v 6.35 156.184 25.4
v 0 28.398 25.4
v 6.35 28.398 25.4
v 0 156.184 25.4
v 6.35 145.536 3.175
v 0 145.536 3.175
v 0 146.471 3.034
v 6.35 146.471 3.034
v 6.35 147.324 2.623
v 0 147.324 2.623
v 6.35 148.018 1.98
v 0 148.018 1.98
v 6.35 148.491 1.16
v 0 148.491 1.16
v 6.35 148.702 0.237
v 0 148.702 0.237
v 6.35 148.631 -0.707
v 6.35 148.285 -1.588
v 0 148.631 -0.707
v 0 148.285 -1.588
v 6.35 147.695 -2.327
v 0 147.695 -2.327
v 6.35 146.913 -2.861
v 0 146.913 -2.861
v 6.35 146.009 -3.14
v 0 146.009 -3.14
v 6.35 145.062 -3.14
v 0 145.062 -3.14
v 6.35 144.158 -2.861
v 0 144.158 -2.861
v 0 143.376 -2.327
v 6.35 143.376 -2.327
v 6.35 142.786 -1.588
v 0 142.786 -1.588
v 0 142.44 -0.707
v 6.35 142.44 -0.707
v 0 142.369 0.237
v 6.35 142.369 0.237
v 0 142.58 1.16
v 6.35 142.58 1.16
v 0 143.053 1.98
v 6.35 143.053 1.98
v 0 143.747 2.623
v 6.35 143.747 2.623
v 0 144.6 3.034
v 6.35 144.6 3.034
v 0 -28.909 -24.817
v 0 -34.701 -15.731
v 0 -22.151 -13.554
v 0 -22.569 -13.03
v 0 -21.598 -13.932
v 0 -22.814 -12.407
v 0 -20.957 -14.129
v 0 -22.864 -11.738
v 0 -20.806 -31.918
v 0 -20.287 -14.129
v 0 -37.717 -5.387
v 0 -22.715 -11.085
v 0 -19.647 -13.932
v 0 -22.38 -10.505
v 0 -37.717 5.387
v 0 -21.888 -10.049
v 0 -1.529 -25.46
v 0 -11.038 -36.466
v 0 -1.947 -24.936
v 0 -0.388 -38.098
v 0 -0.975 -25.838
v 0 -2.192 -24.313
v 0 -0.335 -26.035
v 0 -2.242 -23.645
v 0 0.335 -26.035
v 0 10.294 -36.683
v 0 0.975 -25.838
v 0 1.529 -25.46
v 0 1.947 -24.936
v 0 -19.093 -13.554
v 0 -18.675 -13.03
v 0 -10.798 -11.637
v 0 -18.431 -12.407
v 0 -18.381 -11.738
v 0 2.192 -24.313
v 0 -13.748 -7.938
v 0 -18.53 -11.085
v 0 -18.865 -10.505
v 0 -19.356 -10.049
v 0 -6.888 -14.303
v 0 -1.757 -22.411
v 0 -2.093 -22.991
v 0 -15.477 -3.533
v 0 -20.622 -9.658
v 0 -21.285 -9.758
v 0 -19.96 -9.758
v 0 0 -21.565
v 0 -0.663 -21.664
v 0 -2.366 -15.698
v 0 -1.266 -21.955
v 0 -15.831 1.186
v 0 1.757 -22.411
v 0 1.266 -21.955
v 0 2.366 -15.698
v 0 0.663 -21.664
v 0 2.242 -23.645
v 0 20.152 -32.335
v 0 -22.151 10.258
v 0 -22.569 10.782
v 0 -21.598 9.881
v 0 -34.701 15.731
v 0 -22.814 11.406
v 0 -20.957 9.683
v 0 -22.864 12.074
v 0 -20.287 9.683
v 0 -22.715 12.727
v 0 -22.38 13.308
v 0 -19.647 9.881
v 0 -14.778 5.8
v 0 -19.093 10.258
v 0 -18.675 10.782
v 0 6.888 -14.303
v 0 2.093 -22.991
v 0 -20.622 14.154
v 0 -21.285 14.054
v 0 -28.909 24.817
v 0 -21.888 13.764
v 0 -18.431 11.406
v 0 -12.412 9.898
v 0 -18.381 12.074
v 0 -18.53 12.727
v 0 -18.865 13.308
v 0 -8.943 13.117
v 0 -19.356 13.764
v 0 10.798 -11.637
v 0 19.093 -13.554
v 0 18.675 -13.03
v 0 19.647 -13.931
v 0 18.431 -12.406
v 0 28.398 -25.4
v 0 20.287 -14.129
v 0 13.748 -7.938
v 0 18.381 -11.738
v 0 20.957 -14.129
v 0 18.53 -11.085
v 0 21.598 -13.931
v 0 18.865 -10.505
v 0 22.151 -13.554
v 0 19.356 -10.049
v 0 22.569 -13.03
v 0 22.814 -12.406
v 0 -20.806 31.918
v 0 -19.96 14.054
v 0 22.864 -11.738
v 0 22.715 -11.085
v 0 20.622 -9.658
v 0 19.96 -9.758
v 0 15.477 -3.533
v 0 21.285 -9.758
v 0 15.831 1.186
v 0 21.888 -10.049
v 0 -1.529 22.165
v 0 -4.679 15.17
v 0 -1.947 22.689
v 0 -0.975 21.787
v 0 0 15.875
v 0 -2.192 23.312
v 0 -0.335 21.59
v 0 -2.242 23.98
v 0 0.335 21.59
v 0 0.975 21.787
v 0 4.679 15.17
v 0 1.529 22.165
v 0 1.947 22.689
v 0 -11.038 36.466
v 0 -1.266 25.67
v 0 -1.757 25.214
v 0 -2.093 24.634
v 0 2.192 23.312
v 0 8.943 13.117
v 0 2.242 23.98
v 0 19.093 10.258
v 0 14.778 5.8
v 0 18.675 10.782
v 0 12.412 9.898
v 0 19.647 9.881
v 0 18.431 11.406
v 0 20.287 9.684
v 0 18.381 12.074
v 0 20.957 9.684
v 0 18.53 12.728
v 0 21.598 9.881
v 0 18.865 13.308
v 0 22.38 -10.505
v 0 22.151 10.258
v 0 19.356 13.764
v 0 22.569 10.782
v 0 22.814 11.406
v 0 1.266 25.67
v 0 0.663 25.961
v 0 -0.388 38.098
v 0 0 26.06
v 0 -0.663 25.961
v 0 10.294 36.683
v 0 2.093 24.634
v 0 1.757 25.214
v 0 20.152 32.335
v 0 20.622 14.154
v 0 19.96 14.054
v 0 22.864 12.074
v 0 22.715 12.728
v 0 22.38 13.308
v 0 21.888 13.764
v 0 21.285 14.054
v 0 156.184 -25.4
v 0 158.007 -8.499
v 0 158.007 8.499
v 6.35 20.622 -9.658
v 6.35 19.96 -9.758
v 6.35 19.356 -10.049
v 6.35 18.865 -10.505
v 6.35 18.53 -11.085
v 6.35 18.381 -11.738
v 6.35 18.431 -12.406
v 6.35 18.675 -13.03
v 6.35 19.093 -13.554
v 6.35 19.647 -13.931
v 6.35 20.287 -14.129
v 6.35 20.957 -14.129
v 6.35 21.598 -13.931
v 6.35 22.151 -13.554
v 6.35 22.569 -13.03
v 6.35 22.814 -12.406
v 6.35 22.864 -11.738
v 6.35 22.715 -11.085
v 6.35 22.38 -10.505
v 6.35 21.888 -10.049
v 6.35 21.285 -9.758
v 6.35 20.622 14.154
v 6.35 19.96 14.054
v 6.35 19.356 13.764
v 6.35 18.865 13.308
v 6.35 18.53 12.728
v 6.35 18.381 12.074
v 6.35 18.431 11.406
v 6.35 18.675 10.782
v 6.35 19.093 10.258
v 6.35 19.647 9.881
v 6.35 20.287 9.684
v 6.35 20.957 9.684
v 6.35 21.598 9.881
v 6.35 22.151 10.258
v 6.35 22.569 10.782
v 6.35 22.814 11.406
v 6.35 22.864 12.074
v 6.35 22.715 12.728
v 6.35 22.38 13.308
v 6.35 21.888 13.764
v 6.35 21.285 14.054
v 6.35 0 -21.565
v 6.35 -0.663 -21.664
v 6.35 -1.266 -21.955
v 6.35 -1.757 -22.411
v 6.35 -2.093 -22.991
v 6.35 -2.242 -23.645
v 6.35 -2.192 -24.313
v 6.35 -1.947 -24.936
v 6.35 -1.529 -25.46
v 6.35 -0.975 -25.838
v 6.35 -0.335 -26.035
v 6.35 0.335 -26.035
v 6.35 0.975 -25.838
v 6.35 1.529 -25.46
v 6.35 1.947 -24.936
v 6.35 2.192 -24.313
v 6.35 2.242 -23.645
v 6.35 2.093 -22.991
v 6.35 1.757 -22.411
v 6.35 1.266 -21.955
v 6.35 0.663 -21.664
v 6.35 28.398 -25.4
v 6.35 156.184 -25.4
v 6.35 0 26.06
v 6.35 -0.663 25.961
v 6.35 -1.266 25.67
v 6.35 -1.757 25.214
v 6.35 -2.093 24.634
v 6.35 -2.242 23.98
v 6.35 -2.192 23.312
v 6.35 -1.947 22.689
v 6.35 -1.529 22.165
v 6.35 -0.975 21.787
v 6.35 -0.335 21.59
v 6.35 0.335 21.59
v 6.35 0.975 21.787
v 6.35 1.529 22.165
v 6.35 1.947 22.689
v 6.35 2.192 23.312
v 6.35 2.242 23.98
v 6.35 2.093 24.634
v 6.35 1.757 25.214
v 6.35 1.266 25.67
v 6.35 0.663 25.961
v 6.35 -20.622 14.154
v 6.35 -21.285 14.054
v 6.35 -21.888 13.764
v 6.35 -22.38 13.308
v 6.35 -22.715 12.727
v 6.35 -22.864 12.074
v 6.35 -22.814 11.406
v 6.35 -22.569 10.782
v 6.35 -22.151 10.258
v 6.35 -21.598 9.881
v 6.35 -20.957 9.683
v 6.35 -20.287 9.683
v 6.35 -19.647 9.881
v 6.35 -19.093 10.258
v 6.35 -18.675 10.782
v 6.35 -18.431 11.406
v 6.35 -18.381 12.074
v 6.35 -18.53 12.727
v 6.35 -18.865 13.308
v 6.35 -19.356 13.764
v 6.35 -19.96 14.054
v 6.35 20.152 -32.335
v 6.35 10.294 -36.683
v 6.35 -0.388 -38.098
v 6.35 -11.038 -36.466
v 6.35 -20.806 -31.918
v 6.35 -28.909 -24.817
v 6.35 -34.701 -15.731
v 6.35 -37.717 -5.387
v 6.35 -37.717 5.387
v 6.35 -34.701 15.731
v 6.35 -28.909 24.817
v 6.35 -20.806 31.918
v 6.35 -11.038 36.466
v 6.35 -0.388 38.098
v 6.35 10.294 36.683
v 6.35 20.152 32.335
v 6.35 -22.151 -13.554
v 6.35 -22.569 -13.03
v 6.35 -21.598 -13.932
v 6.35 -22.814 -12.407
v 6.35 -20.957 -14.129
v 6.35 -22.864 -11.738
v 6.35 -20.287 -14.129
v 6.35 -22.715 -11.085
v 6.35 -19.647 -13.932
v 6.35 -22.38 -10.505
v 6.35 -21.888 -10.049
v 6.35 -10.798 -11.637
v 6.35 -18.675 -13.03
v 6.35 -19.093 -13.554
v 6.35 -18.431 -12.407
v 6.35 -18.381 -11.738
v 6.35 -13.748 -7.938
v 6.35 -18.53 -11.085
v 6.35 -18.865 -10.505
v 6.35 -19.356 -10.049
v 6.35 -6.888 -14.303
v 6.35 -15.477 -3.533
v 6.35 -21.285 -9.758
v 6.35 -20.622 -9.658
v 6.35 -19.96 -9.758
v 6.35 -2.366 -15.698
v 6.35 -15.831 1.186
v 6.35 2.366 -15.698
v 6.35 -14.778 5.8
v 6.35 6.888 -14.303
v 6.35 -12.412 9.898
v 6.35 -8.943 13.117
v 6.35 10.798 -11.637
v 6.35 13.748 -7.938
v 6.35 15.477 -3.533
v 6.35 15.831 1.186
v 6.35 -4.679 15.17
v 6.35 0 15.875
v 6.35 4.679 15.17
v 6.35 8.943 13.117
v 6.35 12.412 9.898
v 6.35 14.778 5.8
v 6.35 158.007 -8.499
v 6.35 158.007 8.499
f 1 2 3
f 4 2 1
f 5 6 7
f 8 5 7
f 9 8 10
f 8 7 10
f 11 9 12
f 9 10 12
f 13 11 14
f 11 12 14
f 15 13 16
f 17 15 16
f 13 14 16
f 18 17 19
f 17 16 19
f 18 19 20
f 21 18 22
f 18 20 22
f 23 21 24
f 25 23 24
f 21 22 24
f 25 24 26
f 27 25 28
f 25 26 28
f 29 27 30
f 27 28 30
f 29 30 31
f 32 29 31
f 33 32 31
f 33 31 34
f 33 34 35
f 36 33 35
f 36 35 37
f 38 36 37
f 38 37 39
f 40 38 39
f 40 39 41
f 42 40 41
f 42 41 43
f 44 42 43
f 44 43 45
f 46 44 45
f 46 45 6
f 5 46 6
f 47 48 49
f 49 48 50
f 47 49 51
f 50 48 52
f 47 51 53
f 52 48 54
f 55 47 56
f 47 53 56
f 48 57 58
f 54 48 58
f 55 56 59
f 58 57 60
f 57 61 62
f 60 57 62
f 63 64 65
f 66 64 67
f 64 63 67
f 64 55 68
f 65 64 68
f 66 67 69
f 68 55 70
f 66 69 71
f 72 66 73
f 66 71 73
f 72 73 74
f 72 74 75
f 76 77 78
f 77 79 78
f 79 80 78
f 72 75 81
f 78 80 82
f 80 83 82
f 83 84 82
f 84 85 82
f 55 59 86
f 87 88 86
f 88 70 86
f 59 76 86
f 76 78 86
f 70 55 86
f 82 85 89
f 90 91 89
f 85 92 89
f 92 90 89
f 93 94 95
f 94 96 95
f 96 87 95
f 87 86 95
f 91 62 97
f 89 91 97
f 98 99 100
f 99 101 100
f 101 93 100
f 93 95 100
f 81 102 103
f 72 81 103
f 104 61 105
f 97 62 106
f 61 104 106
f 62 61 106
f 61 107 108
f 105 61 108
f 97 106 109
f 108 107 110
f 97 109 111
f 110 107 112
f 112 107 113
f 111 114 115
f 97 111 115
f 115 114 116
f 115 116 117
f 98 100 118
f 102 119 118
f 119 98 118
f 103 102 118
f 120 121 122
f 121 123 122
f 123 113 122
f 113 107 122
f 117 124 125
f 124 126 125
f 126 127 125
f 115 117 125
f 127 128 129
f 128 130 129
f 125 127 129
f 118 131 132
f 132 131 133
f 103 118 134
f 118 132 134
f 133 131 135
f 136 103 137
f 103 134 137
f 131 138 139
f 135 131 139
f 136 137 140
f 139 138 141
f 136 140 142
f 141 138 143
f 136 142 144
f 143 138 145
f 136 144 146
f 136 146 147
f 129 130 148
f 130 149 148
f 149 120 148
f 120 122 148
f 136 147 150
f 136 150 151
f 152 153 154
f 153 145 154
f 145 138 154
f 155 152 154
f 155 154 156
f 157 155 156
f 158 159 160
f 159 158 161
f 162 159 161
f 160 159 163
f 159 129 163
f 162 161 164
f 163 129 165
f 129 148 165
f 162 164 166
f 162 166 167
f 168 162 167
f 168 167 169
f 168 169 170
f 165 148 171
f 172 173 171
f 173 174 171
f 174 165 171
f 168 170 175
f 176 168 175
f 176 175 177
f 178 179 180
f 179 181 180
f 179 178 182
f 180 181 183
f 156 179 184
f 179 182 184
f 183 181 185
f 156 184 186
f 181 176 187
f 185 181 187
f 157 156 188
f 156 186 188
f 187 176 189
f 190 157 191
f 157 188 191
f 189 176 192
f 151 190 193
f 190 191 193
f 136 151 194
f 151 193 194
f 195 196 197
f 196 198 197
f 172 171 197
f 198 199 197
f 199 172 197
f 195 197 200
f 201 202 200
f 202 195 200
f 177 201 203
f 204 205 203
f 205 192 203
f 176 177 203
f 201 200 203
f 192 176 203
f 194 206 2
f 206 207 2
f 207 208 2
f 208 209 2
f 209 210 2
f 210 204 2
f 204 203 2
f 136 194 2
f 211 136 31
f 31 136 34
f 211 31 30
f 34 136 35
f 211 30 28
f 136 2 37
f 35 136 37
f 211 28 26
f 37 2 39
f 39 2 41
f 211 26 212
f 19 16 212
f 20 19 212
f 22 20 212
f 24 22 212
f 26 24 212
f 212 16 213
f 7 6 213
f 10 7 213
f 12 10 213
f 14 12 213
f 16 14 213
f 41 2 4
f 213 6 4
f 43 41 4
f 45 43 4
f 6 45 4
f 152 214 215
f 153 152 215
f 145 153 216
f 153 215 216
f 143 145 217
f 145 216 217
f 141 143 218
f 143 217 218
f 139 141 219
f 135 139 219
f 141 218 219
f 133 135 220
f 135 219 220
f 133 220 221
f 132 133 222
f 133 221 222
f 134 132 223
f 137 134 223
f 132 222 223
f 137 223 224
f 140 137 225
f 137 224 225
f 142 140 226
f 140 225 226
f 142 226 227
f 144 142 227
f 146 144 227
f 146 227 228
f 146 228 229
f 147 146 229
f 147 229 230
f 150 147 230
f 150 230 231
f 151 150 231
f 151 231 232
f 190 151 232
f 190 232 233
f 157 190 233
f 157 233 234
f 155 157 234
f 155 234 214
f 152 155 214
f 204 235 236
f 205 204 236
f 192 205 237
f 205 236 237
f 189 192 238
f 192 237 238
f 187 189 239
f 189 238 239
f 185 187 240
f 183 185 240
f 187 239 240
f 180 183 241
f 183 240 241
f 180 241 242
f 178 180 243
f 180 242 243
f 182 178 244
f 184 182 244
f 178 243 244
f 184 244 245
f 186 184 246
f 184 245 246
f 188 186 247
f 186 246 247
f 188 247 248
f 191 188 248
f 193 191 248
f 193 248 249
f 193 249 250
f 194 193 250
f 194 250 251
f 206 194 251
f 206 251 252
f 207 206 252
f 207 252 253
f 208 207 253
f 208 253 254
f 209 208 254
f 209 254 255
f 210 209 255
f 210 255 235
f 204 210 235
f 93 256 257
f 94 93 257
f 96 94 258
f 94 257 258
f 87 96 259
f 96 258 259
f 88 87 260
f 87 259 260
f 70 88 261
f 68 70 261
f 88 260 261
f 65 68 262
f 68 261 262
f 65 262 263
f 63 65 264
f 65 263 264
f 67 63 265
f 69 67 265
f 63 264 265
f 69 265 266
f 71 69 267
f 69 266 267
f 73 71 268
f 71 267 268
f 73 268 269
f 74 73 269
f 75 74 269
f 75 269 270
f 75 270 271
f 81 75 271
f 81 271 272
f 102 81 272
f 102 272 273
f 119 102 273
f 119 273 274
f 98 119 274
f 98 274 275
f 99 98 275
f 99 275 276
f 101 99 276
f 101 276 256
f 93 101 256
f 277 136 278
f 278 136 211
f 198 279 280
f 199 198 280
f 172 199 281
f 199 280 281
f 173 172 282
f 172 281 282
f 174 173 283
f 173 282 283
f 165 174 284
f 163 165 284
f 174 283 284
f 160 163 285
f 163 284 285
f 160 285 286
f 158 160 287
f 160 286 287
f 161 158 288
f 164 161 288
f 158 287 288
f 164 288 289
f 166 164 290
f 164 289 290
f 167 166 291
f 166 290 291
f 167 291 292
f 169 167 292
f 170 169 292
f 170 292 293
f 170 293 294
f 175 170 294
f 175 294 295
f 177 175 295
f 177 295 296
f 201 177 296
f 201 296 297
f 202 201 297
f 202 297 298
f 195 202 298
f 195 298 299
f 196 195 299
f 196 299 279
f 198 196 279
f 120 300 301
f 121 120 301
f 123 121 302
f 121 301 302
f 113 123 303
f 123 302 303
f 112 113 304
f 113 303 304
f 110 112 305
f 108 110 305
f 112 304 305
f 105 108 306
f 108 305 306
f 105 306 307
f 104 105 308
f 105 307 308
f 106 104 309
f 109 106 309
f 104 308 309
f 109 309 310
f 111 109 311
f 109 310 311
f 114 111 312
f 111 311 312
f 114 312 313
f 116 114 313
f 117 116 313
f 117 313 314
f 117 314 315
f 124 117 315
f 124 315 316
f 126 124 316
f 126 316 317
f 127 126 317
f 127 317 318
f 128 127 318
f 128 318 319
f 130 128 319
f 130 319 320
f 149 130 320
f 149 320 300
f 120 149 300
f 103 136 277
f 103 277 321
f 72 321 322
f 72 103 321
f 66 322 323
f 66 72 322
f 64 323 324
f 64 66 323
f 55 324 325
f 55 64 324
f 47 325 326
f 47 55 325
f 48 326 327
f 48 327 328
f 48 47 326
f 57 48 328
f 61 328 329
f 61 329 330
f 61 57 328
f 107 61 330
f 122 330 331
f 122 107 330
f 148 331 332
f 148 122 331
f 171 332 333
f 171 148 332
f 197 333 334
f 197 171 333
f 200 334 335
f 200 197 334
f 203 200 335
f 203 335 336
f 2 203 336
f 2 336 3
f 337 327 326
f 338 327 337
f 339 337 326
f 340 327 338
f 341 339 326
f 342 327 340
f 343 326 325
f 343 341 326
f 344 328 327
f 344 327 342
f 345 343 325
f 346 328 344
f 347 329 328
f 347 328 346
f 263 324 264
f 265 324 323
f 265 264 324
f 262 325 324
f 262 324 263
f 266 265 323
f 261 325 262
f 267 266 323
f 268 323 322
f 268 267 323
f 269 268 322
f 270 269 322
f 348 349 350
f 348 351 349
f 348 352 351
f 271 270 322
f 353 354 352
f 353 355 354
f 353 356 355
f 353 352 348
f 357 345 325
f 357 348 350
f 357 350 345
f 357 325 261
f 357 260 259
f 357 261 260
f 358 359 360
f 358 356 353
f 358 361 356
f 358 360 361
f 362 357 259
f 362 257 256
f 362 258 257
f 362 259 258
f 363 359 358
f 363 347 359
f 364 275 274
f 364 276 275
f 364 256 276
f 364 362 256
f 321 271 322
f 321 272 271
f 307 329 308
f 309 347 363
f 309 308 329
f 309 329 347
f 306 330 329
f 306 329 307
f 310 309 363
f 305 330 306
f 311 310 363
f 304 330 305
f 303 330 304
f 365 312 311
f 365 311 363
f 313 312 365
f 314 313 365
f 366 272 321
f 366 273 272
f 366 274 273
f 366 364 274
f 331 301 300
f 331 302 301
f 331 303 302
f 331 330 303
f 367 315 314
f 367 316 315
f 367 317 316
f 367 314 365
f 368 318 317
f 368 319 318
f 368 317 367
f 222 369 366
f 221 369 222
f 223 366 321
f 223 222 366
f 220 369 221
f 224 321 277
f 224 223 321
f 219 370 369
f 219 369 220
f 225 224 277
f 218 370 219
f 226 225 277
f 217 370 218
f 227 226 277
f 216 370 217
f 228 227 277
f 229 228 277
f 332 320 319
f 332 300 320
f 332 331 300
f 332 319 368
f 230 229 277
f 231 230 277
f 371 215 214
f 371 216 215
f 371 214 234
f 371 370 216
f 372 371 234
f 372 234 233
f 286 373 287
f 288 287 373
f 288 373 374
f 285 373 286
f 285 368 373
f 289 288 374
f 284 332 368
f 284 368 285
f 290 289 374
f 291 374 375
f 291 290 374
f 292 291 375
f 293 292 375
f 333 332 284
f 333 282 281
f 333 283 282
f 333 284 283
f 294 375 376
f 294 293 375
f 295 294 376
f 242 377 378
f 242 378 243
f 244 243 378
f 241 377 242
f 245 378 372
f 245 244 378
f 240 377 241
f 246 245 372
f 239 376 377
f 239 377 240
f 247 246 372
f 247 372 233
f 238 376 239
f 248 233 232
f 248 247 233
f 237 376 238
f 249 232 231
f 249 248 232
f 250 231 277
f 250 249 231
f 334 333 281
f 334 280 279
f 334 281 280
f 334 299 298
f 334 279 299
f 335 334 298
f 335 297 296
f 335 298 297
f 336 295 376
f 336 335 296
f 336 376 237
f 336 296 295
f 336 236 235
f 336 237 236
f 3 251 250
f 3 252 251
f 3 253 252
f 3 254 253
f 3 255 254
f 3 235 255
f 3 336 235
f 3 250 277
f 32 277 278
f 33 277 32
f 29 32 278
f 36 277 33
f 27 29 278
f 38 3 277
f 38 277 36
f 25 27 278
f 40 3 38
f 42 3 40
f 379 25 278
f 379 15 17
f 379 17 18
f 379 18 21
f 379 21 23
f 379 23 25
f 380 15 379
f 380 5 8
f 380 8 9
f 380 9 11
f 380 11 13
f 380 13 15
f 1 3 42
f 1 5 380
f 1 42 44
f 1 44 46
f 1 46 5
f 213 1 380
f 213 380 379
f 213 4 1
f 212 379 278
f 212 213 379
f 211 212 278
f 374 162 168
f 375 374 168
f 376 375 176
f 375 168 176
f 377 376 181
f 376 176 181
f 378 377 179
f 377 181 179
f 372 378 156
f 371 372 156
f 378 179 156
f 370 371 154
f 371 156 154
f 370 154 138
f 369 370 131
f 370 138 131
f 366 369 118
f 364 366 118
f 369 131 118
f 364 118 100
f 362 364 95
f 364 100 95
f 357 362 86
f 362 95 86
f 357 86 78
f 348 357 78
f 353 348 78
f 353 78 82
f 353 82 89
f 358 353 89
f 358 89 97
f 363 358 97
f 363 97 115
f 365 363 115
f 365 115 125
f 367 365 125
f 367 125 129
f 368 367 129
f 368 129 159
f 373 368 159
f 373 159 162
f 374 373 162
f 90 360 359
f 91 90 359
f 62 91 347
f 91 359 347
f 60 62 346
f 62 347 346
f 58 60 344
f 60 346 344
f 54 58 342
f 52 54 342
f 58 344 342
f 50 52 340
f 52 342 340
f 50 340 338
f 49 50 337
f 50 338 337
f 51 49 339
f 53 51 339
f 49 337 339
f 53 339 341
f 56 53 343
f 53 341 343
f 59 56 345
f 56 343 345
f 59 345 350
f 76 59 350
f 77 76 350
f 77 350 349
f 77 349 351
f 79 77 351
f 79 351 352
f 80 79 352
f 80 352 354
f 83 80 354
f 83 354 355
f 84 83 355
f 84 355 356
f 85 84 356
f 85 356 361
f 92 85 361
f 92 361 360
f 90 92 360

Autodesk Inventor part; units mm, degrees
ref_plane "YZ Plane" through (0, 0, 0) normal (1, 0, 0) x (0, 1, 0)
ref_plane "XZ Plane" through (0, 0, 0) normal (0, 1, 0) x (-1, 0, 0)
ref_plane "XY Plane" through (0, 0, 0) normal (0, 0, 1) x (1, 0, 0)
sketch "Sketch1" plane through (0, 0, 0) normal (1, 0, 0) x (0, 1, 0)
  circle A0 centre (0, 0) radius 158.2356
  dimension "d0" = 316.4711
extrude "Extrusion1" add sketch "Sketch1" along normal blind 6.35
sketch "Sketch2" plane through (0, 0, 0) normal (-1, 0, 0) x (0, 0, 1)
  circle A0 centre (0, 145.5356) radius 3.175
  point P0 (0, 0)
  dimension "d3" = 6.35
  dimension "d4" = 145.5356
extrude "Extrusion2" cut sketch "Sketch2" against normal through all
sketch "Sketch3" plane through (0, 0, 0) normal (-1, 0, 0) x (0, 0, 1)
  point P0 (0, 0)
  point P1 (23.8125, 0)
  point P2 (11.9063, 20.6222)
  point P3 (-11.9062, 20.6222)
  point P4 (-23.8125, 0)
  point P5 (-11.9063, -20.6222)
  point P6 (11.9062, -20.6222)
  dimension "d7" = 23.8125
  dimension "d10" = 360
hole "Hole1" at (0, 0, 23.8125) at (0, 20.6222, 11.9063) at (0, 20.6222, -11.9062) at (0, 0, -23.8125) at (0, -20.6222, -11.9063) at (0, -20.6222, 11.9062) direction (1, 0, 0) diameter 4.4958 end through all clearance for "Flat Head Machine Screw (82)" size "#8" standard "Ansi Unified Screw Threads"
sketch "Sketch4" plane through (0, 0, 0) normal (-1, 0, 0) x (0, 0, 1)
  circle A0 centre (0, 0) radius 15.875
  dimension "d19" = 31.75
extrude "Extrusion3" cut sketch "Sketch4" against normal through all
sketch "Sketch6" plane through (0, 0, 0) normal (-1, 0, 0) x (0, 0, 1)
  arc A0 (-25.4, 28.3981) -> (25.4, 28.3981) centre (0, 0) ccw
  line L0 (-25.4, 28.3981) -> (-25.4, 156.1837)
  circle A1 centre (0, 0) radius 158.2356 projected
  line L1 (25.4, 28.3981) -> (25.4, 156.1837)
  dimension "d29" = 25.4
  dimension "d30" = 25.4
  dimension "d31" = 76.2
extrude "Extrusion4" cut sketch "Sketch6" against normal through all contours A0 L1 A1 L0 picked at (-31.115, 112.3302)
equation "\"d0\" = camPlateDiam"
equation "\"d1\" = camPlateThickness"
equation "\"d3\" = camPostHoleDiam"
equation "\"d4\" = camRadius"
equation "\"d5\" = camPlateThickness"
equation "\"d7\" = am6HoleRadius"
equation "\"d19\" = centerHoleDiam"
equation "\"camPlateThickness\" = 6.35"
equation "\"camPostHoleDiam\" = 6.35"
equation "\"camPostHeight\" = 25.4"
equation "\"camRadius\" = 0.5 * camDiam"
equation "\"aM6HoleDiam\" = 47.625"
equation "\"am6HoleRadius\" = 0.5 * aM6HoleDiam"
equation "\"centerHoleDiam\" = 31.75"
equation "\"camStroke\" = 152.4"
equation "\"pi\" = 79.7941"
equation "\"camPlateDiam\" = 316.471144"
equation "\"camDiam\" = 291.071144"
properties part number "camPlateCircular" material "Aluminum 6061"
